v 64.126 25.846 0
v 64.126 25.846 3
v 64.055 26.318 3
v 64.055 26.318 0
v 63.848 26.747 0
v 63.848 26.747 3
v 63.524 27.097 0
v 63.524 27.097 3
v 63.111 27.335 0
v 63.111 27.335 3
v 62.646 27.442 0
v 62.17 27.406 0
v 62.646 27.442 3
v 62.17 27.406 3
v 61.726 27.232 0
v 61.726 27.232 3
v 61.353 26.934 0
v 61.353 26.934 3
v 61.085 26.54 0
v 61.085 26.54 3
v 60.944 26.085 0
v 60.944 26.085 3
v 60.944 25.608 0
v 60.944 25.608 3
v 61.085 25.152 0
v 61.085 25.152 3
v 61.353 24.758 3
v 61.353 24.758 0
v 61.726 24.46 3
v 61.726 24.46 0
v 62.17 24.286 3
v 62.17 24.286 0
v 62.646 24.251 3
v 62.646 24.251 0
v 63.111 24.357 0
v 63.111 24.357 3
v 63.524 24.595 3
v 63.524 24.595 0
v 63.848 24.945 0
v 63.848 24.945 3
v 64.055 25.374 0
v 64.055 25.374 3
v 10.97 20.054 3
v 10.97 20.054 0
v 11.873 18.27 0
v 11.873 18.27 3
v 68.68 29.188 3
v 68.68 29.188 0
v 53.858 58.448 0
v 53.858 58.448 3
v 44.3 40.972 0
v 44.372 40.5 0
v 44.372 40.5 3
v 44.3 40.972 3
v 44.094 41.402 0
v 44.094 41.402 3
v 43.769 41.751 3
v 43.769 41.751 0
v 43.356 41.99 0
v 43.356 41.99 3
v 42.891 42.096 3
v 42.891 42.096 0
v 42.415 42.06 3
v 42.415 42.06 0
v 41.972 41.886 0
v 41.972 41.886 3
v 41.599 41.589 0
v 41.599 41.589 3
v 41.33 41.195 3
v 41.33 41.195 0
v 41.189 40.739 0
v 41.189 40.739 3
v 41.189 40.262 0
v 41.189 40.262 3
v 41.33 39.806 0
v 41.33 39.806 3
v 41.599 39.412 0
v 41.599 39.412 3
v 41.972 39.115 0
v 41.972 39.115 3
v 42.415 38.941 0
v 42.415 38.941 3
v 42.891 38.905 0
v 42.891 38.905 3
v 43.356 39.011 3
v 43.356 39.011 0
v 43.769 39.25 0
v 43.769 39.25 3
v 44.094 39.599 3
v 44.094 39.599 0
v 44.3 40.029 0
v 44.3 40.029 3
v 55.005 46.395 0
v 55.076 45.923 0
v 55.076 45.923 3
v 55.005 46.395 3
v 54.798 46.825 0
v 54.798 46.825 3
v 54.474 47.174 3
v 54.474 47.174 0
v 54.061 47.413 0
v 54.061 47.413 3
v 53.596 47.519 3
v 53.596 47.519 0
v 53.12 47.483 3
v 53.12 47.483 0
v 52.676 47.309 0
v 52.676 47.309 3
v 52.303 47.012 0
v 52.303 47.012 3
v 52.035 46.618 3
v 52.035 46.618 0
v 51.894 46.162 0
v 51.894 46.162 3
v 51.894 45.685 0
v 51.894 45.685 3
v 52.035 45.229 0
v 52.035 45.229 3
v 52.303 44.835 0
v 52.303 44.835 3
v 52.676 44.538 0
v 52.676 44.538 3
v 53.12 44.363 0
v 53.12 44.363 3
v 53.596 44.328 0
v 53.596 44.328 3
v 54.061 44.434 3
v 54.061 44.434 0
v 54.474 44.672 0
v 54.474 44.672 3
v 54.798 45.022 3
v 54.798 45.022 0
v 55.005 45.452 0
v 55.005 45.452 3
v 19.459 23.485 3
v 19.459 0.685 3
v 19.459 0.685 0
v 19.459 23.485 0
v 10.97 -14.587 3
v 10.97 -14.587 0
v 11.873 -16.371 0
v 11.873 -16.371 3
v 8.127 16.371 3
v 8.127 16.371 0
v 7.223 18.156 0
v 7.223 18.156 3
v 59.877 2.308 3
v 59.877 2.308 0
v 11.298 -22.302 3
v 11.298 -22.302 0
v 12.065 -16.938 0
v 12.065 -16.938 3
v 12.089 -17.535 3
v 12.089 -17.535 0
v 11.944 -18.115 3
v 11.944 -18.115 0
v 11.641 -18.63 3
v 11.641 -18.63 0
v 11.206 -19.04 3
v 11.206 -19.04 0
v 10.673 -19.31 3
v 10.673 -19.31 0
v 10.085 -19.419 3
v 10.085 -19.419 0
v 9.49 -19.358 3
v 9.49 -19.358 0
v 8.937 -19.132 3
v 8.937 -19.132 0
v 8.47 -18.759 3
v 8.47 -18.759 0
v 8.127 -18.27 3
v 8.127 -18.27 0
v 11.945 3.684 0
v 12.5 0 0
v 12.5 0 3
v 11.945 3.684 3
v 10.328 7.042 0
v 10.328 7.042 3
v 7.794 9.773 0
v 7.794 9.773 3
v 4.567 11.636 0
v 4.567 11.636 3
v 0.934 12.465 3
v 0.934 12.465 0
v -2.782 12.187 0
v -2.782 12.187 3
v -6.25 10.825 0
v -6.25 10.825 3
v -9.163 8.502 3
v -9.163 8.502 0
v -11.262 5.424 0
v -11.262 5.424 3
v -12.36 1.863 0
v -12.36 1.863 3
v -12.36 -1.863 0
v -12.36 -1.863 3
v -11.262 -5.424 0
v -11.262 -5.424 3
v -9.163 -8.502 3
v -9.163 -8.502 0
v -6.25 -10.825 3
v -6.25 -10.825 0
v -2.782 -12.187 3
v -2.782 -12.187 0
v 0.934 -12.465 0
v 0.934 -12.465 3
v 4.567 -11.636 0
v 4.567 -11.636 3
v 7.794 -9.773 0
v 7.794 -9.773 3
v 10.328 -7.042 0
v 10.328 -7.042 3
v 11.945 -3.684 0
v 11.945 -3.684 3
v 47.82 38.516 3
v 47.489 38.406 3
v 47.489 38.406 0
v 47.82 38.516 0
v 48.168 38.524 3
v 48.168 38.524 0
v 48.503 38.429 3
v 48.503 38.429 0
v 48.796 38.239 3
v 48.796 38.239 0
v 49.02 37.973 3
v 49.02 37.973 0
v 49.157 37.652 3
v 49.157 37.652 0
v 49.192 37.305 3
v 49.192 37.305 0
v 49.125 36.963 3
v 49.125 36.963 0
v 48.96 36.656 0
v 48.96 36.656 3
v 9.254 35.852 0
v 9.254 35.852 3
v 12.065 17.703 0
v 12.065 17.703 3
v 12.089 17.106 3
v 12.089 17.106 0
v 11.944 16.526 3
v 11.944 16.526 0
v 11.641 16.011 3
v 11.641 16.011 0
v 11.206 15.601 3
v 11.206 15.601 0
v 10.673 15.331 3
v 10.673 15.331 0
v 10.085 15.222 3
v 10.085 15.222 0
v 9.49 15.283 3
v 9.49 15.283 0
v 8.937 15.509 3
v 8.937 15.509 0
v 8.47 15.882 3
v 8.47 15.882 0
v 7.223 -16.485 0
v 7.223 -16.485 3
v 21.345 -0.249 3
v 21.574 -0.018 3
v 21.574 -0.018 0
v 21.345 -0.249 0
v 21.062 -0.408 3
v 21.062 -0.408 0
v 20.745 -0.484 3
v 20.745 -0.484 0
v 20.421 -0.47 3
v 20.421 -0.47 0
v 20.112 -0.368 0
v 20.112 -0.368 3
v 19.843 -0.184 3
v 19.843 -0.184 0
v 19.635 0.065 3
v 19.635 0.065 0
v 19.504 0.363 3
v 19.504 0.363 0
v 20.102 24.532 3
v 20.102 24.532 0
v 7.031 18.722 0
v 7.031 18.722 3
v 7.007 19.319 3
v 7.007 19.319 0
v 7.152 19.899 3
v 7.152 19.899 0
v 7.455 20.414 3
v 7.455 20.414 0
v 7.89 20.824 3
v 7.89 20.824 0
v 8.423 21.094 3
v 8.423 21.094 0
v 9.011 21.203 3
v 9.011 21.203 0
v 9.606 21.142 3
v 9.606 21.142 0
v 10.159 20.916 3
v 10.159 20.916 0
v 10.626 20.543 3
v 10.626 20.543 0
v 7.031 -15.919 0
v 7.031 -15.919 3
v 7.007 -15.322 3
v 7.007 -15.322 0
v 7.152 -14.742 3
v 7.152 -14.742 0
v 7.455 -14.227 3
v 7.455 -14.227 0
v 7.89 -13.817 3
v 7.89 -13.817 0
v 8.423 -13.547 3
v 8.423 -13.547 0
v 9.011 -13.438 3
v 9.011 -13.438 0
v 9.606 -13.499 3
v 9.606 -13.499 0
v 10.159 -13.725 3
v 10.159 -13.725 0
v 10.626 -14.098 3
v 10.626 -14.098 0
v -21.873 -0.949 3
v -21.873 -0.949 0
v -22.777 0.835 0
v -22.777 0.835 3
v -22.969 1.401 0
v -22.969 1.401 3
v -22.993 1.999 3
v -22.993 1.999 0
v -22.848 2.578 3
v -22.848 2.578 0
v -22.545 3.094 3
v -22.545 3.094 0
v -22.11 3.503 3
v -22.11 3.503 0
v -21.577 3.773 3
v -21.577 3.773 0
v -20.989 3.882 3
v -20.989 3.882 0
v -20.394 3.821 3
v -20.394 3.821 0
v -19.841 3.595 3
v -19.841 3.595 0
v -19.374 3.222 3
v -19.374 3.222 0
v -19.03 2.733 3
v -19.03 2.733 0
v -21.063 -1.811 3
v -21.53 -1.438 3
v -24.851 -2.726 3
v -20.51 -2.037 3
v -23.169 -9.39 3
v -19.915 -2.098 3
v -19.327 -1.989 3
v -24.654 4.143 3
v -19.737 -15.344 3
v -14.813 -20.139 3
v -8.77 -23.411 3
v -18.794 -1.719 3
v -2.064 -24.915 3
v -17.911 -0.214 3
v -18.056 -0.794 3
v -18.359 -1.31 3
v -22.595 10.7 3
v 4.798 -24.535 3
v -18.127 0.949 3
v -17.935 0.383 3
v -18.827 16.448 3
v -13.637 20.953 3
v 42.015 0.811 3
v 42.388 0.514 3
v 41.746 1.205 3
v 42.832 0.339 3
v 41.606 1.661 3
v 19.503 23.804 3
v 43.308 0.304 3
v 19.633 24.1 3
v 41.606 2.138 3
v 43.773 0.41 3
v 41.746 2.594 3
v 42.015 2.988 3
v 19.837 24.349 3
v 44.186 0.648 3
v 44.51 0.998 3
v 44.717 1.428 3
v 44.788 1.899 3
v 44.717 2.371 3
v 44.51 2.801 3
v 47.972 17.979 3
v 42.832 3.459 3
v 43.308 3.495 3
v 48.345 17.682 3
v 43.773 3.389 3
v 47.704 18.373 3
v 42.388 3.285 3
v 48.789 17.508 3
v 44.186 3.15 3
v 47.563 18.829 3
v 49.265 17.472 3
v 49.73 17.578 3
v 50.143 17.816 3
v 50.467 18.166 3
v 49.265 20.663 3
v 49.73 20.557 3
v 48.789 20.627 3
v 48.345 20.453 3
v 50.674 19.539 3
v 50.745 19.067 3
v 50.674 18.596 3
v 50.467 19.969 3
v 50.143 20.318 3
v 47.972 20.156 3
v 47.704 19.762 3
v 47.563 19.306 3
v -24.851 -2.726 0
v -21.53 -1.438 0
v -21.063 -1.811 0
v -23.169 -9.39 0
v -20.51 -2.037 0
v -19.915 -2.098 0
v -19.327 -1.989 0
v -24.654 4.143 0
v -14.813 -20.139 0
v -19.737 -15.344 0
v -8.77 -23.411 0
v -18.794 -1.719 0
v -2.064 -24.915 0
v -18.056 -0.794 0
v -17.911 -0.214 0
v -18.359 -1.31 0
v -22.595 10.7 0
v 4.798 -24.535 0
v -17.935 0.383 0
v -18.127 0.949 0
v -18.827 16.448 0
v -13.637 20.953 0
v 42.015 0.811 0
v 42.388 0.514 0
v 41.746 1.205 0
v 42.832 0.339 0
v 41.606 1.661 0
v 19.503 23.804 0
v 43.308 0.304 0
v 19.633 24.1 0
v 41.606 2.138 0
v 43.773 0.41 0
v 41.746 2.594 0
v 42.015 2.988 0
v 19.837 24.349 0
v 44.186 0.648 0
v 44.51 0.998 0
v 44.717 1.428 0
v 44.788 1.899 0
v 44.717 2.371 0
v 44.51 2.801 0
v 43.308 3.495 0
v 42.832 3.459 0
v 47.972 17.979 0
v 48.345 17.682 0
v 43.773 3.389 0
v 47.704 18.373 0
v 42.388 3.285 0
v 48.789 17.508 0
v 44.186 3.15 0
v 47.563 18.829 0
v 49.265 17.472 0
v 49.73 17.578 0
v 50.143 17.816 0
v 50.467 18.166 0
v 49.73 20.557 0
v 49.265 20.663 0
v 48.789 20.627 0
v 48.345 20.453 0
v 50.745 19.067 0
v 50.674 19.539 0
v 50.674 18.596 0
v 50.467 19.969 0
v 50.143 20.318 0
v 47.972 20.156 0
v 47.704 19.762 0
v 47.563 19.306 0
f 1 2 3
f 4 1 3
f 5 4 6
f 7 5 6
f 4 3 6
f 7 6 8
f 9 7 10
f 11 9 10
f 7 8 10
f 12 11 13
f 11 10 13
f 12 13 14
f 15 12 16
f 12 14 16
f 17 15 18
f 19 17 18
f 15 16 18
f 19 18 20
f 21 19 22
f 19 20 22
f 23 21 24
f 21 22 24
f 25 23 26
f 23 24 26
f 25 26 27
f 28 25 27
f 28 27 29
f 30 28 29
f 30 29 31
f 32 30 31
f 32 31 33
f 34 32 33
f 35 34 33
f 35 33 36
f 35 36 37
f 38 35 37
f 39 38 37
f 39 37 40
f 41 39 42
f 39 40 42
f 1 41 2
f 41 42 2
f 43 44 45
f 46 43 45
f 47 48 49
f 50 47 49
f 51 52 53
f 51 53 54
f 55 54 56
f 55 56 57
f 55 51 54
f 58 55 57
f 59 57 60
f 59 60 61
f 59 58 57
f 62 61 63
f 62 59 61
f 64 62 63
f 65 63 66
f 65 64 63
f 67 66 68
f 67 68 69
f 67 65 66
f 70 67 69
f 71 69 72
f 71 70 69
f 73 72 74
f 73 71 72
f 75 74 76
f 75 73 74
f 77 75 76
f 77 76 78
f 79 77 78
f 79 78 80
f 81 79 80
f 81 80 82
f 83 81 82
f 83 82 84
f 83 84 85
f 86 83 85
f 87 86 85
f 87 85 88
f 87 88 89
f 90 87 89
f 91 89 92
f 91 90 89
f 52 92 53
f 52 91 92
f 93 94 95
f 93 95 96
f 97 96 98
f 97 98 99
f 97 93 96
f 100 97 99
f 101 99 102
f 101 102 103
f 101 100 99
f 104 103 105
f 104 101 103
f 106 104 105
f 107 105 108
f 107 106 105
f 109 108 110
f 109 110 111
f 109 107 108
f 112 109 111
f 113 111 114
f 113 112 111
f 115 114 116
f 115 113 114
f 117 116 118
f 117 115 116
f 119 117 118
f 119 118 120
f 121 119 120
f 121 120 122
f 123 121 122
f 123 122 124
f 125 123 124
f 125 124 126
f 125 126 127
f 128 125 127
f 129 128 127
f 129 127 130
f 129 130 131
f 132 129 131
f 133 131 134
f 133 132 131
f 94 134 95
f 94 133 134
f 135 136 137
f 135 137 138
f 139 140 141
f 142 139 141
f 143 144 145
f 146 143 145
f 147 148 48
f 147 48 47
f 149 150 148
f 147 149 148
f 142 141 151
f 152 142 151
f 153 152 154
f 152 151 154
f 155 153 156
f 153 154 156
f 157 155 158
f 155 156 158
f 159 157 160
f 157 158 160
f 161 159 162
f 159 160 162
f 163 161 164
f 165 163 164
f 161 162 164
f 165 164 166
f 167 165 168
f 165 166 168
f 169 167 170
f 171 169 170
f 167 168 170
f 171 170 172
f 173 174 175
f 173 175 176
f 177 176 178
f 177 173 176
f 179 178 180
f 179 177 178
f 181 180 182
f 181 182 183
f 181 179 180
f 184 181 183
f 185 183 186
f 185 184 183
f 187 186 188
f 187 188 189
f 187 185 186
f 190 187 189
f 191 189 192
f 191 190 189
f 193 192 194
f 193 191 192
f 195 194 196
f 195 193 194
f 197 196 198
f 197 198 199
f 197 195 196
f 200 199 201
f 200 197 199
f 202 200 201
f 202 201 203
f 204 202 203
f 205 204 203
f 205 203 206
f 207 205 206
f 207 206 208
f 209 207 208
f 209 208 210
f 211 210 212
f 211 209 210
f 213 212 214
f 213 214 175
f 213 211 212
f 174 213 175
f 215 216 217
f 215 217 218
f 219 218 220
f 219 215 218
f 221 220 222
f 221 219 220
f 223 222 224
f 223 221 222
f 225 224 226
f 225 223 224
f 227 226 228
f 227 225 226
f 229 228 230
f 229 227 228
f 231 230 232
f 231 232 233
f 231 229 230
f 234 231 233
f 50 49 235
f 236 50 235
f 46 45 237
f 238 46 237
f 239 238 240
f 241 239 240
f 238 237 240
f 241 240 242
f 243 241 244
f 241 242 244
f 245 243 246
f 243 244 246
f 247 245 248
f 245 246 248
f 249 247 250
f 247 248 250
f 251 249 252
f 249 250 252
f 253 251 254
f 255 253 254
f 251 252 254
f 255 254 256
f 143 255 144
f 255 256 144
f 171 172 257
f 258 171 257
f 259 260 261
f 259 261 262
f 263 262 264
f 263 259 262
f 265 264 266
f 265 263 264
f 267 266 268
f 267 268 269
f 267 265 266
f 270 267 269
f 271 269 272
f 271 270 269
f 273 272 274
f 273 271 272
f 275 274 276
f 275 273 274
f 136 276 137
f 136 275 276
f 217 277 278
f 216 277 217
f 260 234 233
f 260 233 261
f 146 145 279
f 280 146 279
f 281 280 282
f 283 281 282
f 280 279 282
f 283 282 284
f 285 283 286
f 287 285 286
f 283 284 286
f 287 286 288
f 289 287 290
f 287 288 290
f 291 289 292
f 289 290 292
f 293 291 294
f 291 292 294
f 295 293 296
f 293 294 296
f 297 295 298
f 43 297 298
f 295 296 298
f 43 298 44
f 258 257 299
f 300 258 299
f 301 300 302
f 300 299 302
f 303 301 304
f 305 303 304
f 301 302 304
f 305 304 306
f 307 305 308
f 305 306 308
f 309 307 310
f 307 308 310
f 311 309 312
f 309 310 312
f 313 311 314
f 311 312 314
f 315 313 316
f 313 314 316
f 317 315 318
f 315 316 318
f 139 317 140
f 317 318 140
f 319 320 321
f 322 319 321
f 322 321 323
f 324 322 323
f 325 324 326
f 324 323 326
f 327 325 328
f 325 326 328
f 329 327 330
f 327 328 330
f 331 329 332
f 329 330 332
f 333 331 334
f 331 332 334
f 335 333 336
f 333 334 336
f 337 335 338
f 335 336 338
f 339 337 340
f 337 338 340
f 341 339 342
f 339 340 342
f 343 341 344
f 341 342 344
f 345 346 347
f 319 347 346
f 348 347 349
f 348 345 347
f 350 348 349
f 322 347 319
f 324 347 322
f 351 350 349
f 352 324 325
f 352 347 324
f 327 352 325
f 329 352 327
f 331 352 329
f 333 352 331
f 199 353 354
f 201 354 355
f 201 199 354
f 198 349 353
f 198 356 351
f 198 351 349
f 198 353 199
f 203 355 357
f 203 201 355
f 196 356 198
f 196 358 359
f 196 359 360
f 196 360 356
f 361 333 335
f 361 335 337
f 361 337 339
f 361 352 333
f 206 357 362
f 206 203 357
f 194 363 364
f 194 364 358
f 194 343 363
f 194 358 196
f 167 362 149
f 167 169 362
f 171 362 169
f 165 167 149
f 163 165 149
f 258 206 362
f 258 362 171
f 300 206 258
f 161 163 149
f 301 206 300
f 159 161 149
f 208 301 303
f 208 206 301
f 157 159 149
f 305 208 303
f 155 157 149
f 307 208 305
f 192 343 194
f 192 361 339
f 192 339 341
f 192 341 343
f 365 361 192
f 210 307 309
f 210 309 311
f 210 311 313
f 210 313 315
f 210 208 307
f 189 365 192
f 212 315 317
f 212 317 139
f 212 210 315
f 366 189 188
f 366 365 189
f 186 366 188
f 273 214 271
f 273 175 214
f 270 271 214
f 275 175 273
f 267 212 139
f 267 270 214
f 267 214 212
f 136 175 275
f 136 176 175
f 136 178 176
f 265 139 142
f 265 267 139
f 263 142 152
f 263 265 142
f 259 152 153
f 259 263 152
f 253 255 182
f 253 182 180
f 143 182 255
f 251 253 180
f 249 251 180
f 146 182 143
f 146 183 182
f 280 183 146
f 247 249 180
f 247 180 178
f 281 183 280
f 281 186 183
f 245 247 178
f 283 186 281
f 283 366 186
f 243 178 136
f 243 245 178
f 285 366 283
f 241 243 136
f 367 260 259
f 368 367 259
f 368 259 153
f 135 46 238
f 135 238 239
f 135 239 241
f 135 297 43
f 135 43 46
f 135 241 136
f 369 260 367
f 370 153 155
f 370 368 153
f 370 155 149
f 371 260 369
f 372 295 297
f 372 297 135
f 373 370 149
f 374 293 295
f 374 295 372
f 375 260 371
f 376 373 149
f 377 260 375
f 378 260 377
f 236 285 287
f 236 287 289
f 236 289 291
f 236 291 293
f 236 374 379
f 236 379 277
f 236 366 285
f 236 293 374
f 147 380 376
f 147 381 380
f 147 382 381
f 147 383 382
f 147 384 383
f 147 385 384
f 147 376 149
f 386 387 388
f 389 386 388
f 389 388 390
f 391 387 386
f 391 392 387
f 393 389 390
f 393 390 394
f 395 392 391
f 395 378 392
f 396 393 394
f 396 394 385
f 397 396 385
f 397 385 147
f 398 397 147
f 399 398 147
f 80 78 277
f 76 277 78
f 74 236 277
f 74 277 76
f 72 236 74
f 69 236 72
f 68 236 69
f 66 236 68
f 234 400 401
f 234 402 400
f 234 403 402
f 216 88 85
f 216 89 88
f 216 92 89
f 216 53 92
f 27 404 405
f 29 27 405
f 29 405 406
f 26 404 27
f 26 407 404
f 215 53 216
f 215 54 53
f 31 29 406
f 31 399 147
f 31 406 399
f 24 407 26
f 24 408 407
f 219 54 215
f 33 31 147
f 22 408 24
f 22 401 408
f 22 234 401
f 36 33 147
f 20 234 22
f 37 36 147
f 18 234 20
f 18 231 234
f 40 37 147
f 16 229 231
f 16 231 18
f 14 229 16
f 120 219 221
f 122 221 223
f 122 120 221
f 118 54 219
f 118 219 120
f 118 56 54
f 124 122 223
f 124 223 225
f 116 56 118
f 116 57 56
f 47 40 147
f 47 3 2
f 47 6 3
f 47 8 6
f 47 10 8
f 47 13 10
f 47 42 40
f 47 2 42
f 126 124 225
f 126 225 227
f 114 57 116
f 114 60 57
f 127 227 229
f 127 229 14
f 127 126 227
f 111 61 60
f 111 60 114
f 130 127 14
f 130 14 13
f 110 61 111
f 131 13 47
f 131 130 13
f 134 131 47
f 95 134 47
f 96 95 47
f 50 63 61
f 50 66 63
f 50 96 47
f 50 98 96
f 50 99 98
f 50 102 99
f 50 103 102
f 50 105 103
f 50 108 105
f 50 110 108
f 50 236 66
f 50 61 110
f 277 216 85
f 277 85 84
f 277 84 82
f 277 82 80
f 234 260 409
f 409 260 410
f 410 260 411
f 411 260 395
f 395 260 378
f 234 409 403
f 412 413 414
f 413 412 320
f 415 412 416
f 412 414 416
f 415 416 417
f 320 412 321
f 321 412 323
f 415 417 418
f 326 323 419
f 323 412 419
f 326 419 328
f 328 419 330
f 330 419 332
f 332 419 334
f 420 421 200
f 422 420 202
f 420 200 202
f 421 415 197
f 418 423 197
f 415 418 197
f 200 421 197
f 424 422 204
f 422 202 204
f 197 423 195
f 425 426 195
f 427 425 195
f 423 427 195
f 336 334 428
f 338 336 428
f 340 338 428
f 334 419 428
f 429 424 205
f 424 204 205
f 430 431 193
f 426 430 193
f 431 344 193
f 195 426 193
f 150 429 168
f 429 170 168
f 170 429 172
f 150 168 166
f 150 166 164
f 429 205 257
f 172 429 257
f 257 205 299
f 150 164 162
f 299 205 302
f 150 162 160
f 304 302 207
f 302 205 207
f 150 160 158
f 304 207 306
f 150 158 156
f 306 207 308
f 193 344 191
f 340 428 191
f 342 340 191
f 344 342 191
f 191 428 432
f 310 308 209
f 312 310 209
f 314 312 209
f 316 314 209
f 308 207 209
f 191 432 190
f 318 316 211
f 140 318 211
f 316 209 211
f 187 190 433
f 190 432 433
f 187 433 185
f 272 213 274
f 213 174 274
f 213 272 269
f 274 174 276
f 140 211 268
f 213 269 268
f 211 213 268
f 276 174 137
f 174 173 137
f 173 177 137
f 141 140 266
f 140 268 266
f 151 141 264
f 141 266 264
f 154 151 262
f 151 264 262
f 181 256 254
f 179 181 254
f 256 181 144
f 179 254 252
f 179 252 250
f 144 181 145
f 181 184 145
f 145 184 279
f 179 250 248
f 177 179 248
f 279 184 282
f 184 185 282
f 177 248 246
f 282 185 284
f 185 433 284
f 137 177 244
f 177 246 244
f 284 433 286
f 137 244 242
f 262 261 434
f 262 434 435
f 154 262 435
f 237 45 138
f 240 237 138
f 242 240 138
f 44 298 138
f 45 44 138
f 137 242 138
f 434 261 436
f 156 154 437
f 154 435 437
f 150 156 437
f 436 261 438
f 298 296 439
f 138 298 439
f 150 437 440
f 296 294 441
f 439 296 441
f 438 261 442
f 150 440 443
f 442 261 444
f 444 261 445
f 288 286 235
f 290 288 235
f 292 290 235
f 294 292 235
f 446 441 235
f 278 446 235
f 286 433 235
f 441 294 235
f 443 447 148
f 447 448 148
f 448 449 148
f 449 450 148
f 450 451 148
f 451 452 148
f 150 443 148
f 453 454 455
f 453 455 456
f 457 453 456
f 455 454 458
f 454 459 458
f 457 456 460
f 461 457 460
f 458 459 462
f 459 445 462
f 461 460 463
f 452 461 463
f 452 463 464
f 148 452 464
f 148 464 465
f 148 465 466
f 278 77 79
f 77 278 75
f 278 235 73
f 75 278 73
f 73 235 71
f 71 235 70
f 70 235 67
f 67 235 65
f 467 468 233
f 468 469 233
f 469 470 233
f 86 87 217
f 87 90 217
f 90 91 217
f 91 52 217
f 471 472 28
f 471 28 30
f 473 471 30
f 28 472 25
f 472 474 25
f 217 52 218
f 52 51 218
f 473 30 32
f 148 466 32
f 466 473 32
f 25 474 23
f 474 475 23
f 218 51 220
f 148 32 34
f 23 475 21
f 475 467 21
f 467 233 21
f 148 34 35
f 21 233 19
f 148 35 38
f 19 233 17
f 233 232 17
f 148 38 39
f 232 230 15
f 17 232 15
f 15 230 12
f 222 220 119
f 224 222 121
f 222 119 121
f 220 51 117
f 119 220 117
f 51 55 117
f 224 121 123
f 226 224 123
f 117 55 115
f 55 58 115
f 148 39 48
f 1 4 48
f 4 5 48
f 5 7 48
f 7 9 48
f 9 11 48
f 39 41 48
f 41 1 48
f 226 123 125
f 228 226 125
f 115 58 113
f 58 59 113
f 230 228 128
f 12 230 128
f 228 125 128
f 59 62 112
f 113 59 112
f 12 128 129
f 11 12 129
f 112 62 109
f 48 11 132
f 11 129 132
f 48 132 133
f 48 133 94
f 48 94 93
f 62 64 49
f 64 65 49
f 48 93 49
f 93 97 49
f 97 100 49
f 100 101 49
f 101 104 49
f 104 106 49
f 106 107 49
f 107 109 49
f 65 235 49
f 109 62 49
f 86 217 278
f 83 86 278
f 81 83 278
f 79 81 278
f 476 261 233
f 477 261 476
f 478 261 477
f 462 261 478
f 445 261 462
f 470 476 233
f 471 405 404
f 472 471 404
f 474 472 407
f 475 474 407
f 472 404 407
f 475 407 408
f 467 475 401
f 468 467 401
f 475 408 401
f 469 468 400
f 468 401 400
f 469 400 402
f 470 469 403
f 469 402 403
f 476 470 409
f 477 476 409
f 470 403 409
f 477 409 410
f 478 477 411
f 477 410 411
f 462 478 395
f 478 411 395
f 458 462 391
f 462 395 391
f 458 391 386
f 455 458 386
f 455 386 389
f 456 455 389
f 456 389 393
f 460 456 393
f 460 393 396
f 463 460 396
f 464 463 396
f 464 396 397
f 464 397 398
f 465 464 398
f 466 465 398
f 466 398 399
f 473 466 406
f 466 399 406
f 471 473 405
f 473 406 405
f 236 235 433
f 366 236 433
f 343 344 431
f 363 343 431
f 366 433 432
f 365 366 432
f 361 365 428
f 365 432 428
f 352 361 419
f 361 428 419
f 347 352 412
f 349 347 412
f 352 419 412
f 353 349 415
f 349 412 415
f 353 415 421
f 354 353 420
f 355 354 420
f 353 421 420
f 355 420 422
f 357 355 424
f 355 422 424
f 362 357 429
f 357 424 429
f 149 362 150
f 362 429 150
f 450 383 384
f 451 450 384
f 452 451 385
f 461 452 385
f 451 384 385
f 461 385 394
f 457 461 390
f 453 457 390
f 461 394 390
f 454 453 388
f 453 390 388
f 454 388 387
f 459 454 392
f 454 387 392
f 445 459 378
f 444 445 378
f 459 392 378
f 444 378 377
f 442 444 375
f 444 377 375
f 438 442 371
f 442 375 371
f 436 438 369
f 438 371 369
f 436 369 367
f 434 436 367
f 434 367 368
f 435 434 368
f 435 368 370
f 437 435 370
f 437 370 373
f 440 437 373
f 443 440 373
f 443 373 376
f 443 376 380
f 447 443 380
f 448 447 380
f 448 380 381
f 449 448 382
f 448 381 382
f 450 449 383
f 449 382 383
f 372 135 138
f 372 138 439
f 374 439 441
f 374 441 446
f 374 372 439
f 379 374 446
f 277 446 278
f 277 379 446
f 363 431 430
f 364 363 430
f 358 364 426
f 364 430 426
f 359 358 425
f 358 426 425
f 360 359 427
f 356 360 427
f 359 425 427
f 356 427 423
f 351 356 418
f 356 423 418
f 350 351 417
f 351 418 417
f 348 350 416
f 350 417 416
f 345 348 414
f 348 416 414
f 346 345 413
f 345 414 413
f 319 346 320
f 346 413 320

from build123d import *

# Parameters (mm, degrees)
SKETCH1_R          = 12.5
SKETCH1_R_2        = 1.6
EXTRUDE1_DEPTH     = 3
CHAMFER1_SIZE      = 20
SKETCH2_R          = 1.6
CUT_EXTRUDE1_DEPTH = 3
CUT_EXTRUDE3_DEPTH = 3


with BuildPart() as part:
    # Sketch1 → Extrude1 (new body)
    with BuildSketch(Plane.XY):
        with BuildLine():
            Line((77.718550226, 11.3466222), (53.857627652, 58.447539112))
            Line((53.857627652, 58.447539112), (9.254486637, 35.851968493))
            Line((9.254486637, 35.851968493), (-13.637193397, 20.952970106))
            ThreePointArc((-13.637193397, 20.952970106), (-21.658878744, -12.485710694), (11.29778531, -22.301570507))
            Line((11.29778531, -22.301570507), (77.718550226, 11.3466222))
        make_face()
        Circle(SKETCH1_R, mode=Mode.SUBTRACT)
        with Locations((53.476276267, 45.923379615)):
            Circle(SKETCH1_R_2, mode=Mode.SUBTRACT)
        with Locations((42.771522423, 40.500442666)):
            Circle(SKETCH1_R_2, mode=Mode.SUBTRACT)
        with BuildLine():
            Line((8.126668077, 16.37149411), (7.222845253, 18.15561975))
            ThreePointArc((7.222845253, 18.15561975), (8.147163209, 20.977965639), (10.969509098, 20.053647682))
            Line((10.969509098, 20.053647682), (11.873331923, 18.269522042))
            ThreePointArc((11.873331923, 18.269522042), (10.949013966, 15.447176153), (8.126668077, 16.37149411))
        make_face(mode=Mode.SUBTRACT)
        with BuildLine():
            Line((-21.873331923, -0.949013966), (-22.777154747, 0.835111675))
            ThreePointArc((-22.777154747, 0.835111675), (-21.852836791, 3.657457563), (-19.030490902, 2.733139607))
            Line((-19.030490902, 2.733139607), (-18.126668077, 0.949013966))
            ThreePointArc((-18.126668077, 0.949013966), (-19.050986034, -1.873331923), (-21.873331923, -0.949013966))
        make_face(mode=Mode.SUBTRACT)
        with BuildLine():
            Line((8.126668077, -18.269522042), (7.222845253, -16.485396401))
            ThreePointArc((7.222845253, -16.485396401), (8.147163209, -13.663050512), (10.969509098, -14.587368469))
            Line((10.969509098, -14.587368469), (11.873331923, -16.37149411))
            ThreePointArc((11.873331923, -16.37149411), (10.949013966, -19.193839998), (8.126668077, -18.269522042))
        make_face(mode=Mode.SUBTRACT)
    extrude(amount=EXTRUDE1_DEPTH)

    # Chamfer1
    chamfer1_edges = [part.edges().sort_by_distance(p)[0] for p in [
        (77.718550226, 11.3466222, 1.5),
    ]]
    chamfer(chamfer1_edges, length=CHAMFER1_SIZE)

    # Sketch2 → Cut-Extrude1 (cut)
    with BuildSketch(Plane.XY.offset(3)):
        with Locations((62.526264519, 25.846086156)):
            Circle(SKETCH2_R)
        with Locations((49.145322214, 19.06741497)):
            Circle(SKETCH2_R)
        with Locations((43.188041489, 1.899305514)):
            Circle(SKETCH2_R)
    extrude(amount=-CUT_EXTRUDE1_DEPTH, mode=Mode.SUBTRACT)

    # Sketch4 → Cut-Extrude3 (cut)
    with BuildSketch(Plane.XY.offset(3)):
        with BuildLine():
            Line((20.102322982, 24.532430534), (47.488856964, 38.406214947))
            ThreePointArc((47.488856964, 38.406214947), (48.918221015, 38.11442299), (48.960317371, 36.656187058))
            Line((48.960317371, 36.656187058), (21.573783389, -0.017867108))
            ThreePointArc((21.573783389, -0.017867108), (20.262801724, -0.42963276), (19.458756207, 0.684698738))
            Line((19.458756207, 0.684698738), (19.458756207, 23.48496849))
            ThreePointArc((19.458756207, 23.48496849), (19.63250249, 24.099654371), (20.102322982, 24.532430534))
        make_face()
    extrude(amount=-CUT_EXTRUDE3_DEPTH, mode=Mode.SUBTRACT)


solid = part.part
